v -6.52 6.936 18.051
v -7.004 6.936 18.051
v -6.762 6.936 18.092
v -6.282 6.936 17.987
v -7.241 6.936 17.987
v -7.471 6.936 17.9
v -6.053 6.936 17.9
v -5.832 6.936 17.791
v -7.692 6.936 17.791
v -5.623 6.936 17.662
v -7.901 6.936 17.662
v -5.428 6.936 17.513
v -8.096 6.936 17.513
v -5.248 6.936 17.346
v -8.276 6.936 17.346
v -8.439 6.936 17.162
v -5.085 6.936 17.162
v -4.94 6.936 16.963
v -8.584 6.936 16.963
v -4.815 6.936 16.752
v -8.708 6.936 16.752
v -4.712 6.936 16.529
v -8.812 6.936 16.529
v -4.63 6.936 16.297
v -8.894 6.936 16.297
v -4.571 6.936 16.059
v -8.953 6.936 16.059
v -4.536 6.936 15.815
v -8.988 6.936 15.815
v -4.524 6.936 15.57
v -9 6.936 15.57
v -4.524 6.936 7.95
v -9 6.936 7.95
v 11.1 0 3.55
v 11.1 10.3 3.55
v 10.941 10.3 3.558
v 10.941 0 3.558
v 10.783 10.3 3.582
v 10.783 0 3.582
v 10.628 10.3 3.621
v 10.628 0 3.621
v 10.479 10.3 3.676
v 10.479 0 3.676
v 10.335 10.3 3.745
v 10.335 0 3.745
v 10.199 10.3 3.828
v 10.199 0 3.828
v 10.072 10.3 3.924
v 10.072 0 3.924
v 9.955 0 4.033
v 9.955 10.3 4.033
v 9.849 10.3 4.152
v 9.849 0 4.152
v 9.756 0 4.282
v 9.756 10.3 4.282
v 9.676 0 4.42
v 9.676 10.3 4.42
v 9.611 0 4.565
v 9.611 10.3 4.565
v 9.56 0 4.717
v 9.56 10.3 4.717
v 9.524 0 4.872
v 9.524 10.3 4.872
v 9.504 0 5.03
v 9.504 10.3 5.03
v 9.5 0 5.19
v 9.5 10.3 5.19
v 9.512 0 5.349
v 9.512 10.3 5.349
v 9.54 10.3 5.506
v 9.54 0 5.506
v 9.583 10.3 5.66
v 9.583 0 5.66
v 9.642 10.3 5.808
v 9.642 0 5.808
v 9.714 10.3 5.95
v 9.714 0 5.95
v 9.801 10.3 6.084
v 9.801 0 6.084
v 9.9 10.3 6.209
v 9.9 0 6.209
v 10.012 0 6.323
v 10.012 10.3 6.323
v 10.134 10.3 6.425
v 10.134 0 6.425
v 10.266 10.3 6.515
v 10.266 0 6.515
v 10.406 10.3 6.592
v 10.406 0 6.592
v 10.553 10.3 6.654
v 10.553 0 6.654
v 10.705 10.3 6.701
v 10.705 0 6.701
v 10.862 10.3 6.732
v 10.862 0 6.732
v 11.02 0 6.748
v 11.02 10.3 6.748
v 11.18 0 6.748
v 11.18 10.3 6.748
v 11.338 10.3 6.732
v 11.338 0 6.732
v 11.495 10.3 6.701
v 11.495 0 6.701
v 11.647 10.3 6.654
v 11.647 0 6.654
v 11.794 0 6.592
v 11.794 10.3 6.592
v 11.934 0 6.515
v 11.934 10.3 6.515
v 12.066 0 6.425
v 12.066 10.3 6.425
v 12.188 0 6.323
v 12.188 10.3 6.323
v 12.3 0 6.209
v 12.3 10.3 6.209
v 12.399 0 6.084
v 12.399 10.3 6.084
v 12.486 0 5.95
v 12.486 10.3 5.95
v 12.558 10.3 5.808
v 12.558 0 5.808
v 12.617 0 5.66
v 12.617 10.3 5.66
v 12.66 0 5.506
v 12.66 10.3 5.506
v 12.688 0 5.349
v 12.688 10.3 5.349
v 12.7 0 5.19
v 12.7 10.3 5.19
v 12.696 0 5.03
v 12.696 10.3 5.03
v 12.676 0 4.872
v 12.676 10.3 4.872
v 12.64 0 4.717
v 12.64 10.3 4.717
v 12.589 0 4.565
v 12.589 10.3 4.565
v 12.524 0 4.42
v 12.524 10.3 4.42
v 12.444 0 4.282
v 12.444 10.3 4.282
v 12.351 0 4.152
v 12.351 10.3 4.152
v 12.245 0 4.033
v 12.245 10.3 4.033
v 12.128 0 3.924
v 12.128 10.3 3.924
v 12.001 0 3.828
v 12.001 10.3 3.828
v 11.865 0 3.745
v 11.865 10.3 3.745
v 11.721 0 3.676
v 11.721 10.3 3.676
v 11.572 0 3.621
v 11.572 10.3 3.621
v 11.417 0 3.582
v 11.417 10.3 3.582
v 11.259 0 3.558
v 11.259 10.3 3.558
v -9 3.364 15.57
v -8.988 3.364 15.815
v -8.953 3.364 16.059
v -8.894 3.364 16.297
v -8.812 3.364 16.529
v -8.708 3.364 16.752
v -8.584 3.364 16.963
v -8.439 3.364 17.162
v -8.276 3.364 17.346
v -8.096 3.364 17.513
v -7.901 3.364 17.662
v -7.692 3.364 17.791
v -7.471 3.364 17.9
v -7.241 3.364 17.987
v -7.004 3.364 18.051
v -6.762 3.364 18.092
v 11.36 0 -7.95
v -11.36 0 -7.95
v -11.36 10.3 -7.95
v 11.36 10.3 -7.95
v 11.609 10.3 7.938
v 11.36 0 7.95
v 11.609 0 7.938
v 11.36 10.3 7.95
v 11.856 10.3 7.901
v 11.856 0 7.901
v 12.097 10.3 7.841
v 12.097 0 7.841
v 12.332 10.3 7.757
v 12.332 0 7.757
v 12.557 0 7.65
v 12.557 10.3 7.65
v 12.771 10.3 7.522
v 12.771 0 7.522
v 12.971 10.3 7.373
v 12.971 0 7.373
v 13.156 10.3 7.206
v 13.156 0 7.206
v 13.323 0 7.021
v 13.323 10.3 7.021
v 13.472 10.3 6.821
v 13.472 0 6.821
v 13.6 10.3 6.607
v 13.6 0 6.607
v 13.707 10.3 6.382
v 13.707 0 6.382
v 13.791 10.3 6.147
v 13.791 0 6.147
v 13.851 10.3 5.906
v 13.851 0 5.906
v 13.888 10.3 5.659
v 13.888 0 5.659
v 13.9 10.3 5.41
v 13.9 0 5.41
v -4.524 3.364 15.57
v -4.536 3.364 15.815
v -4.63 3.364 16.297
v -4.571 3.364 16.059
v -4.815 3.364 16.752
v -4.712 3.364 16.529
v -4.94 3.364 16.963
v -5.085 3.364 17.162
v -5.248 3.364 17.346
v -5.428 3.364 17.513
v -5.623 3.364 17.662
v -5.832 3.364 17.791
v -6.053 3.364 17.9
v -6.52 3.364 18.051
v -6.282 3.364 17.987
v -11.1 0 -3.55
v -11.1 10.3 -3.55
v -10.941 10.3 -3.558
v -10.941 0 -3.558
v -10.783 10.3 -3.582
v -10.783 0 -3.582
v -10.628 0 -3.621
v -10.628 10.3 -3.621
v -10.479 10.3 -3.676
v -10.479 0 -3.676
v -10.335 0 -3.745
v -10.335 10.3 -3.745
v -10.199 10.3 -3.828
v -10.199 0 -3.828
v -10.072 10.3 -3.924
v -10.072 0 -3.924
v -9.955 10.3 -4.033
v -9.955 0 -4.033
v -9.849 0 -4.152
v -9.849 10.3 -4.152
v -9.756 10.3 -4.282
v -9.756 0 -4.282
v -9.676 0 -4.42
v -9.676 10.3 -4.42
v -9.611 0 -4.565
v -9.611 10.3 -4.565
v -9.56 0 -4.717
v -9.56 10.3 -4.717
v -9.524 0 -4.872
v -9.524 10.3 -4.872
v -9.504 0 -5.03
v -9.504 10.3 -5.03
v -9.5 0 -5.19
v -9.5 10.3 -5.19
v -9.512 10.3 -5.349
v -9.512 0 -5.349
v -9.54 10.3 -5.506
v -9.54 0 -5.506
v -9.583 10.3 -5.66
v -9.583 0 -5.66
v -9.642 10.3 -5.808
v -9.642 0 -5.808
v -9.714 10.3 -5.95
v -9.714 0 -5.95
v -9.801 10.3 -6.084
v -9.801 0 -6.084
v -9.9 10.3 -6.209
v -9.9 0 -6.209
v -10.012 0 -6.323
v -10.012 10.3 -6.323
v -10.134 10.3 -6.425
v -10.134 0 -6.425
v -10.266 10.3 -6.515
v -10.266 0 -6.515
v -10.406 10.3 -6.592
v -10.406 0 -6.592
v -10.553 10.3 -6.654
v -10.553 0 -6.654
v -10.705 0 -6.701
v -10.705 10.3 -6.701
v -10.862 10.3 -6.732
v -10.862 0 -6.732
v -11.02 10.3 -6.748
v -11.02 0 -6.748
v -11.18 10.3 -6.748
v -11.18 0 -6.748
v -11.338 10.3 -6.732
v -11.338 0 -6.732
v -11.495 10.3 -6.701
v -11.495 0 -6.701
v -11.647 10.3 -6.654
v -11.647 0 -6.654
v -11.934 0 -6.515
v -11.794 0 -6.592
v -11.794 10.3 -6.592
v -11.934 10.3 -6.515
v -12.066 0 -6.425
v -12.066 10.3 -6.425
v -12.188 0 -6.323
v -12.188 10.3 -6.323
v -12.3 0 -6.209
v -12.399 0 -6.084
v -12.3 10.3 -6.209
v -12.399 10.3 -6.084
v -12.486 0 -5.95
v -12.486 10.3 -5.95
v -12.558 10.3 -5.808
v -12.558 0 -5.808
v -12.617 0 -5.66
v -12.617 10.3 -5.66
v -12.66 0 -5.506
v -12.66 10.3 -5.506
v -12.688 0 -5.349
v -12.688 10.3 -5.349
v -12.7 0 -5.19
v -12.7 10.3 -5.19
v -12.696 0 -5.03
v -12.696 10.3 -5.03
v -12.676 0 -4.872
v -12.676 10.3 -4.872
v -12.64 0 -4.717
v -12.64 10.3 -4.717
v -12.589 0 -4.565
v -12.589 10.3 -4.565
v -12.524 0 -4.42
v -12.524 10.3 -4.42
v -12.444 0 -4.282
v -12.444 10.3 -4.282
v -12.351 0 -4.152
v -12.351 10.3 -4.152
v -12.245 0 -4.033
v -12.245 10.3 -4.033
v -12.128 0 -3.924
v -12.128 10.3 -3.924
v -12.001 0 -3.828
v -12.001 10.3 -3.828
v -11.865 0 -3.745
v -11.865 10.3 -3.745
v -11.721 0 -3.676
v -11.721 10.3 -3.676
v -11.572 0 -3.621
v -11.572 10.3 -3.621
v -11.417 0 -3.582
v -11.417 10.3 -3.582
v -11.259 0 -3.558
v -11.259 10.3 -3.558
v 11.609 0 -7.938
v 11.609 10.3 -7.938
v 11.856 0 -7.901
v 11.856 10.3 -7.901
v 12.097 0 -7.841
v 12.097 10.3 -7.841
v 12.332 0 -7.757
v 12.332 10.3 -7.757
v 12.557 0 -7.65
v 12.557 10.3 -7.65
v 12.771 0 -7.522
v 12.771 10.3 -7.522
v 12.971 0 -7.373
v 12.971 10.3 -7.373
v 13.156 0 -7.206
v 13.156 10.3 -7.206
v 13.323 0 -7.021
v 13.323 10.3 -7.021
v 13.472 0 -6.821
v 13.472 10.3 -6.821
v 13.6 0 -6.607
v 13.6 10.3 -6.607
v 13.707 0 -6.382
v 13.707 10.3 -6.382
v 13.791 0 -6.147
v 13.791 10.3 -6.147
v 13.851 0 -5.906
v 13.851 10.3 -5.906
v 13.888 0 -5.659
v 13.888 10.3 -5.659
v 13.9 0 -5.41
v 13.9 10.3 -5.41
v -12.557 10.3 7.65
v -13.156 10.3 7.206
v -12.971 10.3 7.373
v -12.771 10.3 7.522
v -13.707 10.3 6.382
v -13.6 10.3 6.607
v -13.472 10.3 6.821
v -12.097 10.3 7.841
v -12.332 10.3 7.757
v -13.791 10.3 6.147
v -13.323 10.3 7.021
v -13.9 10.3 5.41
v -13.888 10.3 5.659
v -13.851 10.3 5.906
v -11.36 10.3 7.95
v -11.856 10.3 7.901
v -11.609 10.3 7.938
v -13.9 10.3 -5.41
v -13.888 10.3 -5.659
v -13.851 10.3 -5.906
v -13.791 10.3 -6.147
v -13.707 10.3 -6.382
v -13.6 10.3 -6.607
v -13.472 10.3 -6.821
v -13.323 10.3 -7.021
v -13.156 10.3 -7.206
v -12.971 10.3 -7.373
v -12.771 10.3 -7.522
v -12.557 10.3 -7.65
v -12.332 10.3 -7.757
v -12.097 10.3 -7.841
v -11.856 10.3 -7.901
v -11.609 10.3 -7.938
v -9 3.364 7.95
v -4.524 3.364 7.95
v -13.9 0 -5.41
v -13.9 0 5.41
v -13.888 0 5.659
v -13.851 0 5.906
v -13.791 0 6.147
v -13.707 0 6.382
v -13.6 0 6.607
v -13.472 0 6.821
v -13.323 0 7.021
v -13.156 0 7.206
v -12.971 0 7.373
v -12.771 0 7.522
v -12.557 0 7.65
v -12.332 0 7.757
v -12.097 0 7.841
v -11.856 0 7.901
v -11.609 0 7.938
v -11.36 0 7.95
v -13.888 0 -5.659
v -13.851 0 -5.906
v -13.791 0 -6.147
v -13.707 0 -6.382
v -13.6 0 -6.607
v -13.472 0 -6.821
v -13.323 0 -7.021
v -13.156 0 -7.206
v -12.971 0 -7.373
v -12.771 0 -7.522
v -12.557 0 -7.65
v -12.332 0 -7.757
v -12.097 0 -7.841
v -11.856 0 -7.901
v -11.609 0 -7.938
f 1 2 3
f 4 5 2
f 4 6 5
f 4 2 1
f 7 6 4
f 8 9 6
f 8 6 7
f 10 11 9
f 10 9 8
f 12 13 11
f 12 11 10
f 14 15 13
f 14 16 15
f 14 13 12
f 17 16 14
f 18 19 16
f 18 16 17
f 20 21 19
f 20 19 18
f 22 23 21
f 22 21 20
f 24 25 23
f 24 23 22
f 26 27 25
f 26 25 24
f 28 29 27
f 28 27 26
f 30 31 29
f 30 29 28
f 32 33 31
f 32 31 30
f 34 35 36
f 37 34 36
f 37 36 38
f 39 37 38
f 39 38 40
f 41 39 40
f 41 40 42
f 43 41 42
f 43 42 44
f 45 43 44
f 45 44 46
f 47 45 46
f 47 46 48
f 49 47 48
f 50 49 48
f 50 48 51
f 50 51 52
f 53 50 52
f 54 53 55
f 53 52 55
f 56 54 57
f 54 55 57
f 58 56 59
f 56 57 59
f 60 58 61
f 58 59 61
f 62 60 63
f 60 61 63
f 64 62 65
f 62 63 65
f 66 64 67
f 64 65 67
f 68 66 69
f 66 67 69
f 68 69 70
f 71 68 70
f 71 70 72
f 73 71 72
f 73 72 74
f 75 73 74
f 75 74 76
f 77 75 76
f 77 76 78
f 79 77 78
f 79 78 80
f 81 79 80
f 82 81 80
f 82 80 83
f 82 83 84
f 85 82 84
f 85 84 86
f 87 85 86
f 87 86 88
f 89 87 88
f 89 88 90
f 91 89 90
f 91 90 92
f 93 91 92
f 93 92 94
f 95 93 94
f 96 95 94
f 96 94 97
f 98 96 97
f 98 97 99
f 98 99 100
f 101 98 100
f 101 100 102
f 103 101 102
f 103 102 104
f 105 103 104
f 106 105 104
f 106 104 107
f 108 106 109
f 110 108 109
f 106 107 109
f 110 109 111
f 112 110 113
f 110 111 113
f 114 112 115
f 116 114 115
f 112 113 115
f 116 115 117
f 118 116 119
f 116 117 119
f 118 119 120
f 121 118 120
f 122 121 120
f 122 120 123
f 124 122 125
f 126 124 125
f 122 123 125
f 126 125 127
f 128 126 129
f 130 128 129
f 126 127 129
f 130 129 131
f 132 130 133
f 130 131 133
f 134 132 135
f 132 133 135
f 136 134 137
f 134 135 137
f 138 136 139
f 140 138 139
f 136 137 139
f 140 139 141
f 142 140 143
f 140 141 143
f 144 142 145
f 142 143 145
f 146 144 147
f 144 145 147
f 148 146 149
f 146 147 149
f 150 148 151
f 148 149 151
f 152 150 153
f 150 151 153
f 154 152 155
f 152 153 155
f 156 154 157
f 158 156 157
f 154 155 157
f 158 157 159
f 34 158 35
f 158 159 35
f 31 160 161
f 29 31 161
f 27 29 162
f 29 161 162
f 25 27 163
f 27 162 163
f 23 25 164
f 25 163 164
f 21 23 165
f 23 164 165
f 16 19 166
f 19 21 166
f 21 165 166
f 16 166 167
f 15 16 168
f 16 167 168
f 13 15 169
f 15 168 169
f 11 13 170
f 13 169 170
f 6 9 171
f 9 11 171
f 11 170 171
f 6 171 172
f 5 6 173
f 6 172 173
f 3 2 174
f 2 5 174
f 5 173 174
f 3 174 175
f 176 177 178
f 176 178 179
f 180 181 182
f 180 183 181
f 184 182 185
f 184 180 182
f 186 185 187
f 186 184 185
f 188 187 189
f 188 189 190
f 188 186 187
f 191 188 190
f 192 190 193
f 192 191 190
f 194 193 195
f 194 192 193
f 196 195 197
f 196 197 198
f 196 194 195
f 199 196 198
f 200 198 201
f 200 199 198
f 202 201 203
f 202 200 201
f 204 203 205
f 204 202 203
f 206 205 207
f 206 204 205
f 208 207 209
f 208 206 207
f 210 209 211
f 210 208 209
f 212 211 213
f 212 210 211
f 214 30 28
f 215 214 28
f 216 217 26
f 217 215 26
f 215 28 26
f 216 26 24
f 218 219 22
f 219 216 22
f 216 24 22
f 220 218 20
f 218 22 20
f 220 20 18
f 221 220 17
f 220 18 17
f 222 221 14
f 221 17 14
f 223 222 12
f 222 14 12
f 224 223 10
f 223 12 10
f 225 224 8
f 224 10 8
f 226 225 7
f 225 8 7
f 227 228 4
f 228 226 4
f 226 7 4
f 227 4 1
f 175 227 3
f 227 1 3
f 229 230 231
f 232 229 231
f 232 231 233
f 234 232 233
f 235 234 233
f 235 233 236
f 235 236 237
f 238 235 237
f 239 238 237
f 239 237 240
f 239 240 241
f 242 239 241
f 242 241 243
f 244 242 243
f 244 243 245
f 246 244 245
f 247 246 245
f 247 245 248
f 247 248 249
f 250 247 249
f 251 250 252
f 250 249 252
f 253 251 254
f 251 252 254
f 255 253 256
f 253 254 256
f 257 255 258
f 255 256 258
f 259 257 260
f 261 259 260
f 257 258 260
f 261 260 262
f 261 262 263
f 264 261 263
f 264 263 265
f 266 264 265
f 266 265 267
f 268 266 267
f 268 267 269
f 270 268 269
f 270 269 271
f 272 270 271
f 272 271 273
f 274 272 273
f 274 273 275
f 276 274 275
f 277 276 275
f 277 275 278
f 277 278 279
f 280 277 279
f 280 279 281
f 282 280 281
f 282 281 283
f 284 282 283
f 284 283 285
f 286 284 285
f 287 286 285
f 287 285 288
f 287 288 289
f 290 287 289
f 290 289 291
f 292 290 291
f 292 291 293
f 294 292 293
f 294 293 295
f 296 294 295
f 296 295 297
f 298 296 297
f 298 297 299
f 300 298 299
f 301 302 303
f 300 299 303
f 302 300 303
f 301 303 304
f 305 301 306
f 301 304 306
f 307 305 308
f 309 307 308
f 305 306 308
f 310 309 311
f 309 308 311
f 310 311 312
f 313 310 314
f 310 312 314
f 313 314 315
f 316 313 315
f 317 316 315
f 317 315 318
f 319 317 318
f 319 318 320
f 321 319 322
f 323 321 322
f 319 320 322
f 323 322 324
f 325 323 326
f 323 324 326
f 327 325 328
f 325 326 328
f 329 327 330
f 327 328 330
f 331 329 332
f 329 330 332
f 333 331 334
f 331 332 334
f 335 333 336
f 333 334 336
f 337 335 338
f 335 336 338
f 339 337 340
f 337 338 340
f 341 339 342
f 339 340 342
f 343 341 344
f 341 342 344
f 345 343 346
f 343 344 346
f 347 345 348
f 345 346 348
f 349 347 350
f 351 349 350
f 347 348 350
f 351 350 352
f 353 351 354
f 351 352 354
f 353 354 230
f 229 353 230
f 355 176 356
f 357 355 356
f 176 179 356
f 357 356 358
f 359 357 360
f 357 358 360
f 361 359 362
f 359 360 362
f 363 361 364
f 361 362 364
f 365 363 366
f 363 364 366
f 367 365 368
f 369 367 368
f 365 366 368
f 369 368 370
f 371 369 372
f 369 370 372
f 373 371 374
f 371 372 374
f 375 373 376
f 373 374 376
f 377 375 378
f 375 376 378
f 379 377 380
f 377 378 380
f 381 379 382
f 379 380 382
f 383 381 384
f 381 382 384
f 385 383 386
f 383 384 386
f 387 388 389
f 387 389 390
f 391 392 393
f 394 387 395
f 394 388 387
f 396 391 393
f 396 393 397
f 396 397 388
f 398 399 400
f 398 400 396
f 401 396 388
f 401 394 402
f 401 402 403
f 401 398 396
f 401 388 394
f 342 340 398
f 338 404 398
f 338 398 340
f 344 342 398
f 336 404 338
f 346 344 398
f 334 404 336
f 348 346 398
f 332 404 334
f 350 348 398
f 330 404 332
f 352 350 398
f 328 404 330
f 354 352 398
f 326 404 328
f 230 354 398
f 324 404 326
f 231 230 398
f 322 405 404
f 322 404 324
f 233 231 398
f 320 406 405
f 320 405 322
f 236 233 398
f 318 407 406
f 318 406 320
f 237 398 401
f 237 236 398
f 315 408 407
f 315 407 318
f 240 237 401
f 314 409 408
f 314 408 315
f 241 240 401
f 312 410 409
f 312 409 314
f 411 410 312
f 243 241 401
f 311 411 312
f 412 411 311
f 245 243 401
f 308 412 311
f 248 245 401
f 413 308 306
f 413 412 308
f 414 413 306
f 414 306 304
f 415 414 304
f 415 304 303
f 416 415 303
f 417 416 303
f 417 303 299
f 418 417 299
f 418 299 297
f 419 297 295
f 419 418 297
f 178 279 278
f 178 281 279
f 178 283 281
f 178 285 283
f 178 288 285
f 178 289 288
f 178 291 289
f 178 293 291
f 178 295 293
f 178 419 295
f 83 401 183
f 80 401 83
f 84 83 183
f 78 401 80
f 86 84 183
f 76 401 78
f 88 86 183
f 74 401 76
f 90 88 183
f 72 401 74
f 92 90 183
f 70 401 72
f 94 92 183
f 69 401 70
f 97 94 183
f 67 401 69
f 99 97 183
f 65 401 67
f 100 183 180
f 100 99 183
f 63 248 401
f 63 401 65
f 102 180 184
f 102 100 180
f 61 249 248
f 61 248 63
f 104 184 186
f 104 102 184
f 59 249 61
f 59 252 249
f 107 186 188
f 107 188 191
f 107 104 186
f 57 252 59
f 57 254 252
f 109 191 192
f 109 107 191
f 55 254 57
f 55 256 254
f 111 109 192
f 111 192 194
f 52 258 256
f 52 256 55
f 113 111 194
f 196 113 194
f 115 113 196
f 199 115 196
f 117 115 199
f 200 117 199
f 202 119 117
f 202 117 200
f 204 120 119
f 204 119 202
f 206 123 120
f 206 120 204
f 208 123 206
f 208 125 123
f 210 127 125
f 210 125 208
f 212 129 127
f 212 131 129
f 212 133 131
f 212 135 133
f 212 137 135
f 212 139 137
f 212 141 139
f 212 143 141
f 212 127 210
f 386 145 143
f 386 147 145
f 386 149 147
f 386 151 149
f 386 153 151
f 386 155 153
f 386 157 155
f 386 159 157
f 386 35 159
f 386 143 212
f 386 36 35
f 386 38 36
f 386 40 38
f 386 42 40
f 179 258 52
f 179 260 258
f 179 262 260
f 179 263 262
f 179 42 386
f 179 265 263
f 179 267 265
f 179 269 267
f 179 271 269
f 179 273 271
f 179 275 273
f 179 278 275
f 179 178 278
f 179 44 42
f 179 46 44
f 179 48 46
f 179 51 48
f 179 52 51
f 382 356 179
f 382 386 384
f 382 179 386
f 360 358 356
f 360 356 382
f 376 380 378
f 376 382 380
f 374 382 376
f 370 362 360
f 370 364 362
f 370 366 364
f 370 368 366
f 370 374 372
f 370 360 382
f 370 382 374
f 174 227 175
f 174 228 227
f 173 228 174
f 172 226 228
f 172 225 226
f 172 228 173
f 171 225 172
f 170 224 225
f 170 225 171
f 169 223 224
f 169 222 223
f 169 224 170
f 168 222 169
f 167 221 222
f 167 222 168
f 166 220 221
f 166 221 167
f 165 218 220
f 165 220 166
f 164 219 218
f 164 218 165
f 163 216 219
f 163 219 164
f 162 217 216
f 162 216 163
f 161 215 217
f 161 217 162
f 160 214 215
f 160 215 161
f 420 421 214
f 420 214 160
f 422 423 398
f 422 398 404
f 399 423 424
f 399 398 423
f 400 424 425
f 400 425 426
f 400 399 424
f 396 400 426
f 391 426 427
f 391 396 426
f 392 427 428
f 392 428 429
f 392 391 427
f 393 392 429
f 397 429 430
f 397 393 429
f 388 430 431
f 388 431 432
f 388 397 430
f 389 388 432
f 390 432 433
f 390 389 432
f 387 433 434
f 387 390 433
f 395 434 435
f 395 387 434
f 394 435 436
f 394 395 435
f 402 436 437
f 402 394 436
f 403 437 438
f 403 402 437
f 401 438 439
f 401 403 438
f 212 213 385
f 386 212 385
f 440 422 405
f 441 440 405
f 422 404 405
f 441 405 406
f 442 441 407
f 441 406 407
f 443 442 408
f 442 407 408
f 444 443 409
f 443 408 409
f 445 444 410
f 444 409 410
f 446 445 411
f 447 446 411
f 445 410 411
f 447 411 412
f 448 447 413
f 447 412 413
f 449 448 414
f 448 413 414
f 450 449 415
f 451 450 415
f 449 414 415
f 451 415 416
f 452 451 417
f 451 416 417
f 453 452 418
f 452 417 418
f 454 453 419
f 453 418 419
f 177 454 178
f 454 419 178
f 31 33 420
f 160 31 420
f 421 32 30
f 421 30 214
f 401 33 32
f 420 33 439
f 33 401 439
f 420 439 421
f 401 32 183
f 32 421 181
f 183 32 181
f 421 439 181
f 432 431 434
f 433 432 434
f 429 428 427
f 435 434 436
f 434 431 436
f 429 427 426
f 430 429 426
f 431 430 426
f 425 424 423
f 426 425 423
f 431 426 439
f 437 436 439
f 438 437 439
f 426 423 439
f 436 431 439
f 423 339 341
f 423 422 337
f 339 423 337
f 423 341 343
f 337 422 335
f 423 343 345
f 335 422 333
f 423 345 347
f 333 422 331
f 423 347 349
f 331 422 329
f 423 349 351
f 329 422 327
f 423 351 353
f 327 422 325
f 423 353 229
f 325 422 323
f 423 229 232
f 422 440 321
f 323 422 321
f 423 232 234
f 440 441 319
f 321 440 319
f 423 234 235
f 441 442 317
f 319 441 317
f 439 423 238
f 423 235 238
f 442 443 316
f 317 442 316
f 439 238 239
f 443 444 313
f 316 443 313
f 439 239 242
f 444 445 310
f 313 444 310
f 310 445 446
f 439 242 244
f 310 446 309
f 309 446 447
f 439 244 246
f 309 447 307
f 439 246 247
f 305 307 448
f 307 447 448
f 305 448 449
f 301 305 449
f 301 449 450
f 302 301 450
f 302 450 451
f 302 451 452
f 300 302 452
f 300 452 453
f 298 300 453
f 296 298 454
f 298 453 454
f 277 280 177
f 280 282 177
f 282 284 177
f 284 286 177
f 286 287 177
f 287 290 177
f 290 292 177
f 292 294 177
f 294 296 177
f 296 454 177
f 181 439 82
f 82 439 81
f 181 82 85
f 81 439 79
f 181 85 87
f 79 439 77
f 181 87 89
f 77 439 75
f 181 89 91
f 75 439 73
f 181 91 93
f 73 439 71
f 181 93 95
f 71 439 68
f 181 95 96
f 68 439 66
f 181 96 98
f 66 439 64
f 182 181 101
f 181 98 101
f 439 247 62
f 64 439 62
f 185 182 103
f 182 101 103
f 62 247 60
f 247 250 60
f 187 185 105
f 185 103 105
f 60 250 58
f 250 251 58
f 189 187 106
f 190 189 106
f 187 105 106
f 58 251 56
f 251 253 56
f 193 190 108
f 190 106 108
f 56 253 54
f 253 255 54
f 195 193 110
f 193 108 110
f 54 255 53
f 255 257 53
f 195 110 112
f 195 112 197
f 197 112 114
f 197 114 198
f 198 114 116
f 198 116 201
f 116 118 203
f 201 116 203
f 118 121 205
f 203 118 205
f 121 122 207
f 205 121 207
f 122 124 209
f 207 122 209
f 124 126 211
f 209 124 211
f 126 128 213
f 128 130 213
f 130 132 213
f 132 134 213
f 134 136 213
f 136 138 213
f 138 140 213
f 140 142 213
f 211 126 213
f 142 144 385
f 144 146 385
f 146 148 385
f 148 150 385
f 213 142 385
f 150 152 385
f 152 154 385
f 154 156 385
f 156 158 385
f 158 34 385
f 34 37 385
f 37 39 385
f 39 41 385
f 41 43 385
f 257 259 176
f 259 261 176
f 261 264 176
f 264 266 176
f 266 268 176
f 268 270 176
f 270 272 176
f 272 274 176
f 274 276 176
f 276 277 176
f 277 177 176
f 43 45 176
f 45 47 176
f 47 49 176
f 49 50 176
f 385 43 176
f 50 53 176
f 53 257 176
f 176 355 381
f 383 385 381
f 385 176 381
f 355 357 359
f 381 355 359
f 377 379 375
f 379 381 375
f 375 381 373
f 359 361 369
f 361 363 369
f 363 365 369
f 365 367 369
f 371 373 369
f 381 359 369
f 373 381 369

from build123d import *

# Parameters (mm, degrees)
SKETCH1_W           = 27.8
SKETCH1_H           = 15.9
BOSS_EXTRUDE1_DEPTH = 10.3
SKETCH3_R           = 1.6
CUT_EXTRUDE1_DEPTH  = 20.039498418
CIRPATTERN1_COUNT   = 2
BOSS_EXTRUDE2_DEPTH = 10.16
FILLET1_R           = 2.54
FILLET2_R           = 2.54


with BuildPart() as part:
    # Sketch1 → Boss-Extrude1 (new body)
    with BuildSketch(Plane(origin=(0, 0, 0), x_dir=(1, 0, 0), z_dir=(0, 1, 0))):
        Rectangle(SKETCH1_W, SKETCH1_H)
    extrude(amount=BOSS_EXTRUDE1_DEPTH)

    # Sketch3 → Cut-Extrude1 (cut, through all)
    with BuildSketch(Plane(origin=(0, 10.3, 0), x_dir=(1, 0, 0), z_dir=(0, 1, 0))):
        with Locations(Location((-11.1, 5.15, 0), (0, 0, 270))):
            Circle(SKETCH3_R)
    cut_extrude1 = extrude(amount=-CUT_EXTRUDE1_DEPTH, mode=Mode.SUBTRACT)

    # CirPattern1: Cut-Extrude1 ×2 about axis
    cirpattern1_axis = Axis((0, 0, 0), (0, 1, 0))
    for i in range(1, CIRPATTERN1_COUNT):
        add(cut_extrude1.rotate(cirpattern1_axis, i * 360 / CIRPATTERN1_COUNT), mode=Mode.SUBTRACT)

    # Sketch6 → Boss-Extrude2 (add)
    with BuildSketch(Plane.XY.offset(7.95)):
        Polygon((-9, 5.15), (-9, 6.935608094), (-4.523823192, 6.935608094), (-4.523823192, 3.364391906), (-9, 3.364391906), align=None)
    extrude(amount=BOSS_EXTRUDE2_DEPTH)

    # Fillet1
    fillet1_edges = [part.edges().sort_by_distance(p)[0] for p in [
        (13.9, 5.15, 7.95),
        (-13.9, 5.15, 7.95),
        (-13.9, 5.15, -7.95),
        (13.9, 5.15, -7.95),
    ]]
    fillet(fillet1_edges, radius=FILLET1_R)

    # Fillet2
    # the kernel refuses this fillet: 2.54 mm, written as the material it takes off along each edge
    with BuildSketch(Plane(origin=(-9, -2.985608094, 18.11), x_dir=(0, 0, -1), z_dir=(0, 1, 0)), Plane(origin=(-4.523823192, 13.285608094, 18.11), x_dir=(0, 0, -1), z_dir=(0, -1, 0))) as fillet2_piece_1:
        with BuildLine():
            CenterArc((FILLET2_R, -FILLET2_R), FILLET2_R, 90, 90)
            Line((0, -FILLET2_R), (0, 0))
            Line((0, 0), (FILLET2_R, 0))
        make_face()
    extrude(amount=16.271216188, mode=Mode.SUBTRACT)


solid = part.part
